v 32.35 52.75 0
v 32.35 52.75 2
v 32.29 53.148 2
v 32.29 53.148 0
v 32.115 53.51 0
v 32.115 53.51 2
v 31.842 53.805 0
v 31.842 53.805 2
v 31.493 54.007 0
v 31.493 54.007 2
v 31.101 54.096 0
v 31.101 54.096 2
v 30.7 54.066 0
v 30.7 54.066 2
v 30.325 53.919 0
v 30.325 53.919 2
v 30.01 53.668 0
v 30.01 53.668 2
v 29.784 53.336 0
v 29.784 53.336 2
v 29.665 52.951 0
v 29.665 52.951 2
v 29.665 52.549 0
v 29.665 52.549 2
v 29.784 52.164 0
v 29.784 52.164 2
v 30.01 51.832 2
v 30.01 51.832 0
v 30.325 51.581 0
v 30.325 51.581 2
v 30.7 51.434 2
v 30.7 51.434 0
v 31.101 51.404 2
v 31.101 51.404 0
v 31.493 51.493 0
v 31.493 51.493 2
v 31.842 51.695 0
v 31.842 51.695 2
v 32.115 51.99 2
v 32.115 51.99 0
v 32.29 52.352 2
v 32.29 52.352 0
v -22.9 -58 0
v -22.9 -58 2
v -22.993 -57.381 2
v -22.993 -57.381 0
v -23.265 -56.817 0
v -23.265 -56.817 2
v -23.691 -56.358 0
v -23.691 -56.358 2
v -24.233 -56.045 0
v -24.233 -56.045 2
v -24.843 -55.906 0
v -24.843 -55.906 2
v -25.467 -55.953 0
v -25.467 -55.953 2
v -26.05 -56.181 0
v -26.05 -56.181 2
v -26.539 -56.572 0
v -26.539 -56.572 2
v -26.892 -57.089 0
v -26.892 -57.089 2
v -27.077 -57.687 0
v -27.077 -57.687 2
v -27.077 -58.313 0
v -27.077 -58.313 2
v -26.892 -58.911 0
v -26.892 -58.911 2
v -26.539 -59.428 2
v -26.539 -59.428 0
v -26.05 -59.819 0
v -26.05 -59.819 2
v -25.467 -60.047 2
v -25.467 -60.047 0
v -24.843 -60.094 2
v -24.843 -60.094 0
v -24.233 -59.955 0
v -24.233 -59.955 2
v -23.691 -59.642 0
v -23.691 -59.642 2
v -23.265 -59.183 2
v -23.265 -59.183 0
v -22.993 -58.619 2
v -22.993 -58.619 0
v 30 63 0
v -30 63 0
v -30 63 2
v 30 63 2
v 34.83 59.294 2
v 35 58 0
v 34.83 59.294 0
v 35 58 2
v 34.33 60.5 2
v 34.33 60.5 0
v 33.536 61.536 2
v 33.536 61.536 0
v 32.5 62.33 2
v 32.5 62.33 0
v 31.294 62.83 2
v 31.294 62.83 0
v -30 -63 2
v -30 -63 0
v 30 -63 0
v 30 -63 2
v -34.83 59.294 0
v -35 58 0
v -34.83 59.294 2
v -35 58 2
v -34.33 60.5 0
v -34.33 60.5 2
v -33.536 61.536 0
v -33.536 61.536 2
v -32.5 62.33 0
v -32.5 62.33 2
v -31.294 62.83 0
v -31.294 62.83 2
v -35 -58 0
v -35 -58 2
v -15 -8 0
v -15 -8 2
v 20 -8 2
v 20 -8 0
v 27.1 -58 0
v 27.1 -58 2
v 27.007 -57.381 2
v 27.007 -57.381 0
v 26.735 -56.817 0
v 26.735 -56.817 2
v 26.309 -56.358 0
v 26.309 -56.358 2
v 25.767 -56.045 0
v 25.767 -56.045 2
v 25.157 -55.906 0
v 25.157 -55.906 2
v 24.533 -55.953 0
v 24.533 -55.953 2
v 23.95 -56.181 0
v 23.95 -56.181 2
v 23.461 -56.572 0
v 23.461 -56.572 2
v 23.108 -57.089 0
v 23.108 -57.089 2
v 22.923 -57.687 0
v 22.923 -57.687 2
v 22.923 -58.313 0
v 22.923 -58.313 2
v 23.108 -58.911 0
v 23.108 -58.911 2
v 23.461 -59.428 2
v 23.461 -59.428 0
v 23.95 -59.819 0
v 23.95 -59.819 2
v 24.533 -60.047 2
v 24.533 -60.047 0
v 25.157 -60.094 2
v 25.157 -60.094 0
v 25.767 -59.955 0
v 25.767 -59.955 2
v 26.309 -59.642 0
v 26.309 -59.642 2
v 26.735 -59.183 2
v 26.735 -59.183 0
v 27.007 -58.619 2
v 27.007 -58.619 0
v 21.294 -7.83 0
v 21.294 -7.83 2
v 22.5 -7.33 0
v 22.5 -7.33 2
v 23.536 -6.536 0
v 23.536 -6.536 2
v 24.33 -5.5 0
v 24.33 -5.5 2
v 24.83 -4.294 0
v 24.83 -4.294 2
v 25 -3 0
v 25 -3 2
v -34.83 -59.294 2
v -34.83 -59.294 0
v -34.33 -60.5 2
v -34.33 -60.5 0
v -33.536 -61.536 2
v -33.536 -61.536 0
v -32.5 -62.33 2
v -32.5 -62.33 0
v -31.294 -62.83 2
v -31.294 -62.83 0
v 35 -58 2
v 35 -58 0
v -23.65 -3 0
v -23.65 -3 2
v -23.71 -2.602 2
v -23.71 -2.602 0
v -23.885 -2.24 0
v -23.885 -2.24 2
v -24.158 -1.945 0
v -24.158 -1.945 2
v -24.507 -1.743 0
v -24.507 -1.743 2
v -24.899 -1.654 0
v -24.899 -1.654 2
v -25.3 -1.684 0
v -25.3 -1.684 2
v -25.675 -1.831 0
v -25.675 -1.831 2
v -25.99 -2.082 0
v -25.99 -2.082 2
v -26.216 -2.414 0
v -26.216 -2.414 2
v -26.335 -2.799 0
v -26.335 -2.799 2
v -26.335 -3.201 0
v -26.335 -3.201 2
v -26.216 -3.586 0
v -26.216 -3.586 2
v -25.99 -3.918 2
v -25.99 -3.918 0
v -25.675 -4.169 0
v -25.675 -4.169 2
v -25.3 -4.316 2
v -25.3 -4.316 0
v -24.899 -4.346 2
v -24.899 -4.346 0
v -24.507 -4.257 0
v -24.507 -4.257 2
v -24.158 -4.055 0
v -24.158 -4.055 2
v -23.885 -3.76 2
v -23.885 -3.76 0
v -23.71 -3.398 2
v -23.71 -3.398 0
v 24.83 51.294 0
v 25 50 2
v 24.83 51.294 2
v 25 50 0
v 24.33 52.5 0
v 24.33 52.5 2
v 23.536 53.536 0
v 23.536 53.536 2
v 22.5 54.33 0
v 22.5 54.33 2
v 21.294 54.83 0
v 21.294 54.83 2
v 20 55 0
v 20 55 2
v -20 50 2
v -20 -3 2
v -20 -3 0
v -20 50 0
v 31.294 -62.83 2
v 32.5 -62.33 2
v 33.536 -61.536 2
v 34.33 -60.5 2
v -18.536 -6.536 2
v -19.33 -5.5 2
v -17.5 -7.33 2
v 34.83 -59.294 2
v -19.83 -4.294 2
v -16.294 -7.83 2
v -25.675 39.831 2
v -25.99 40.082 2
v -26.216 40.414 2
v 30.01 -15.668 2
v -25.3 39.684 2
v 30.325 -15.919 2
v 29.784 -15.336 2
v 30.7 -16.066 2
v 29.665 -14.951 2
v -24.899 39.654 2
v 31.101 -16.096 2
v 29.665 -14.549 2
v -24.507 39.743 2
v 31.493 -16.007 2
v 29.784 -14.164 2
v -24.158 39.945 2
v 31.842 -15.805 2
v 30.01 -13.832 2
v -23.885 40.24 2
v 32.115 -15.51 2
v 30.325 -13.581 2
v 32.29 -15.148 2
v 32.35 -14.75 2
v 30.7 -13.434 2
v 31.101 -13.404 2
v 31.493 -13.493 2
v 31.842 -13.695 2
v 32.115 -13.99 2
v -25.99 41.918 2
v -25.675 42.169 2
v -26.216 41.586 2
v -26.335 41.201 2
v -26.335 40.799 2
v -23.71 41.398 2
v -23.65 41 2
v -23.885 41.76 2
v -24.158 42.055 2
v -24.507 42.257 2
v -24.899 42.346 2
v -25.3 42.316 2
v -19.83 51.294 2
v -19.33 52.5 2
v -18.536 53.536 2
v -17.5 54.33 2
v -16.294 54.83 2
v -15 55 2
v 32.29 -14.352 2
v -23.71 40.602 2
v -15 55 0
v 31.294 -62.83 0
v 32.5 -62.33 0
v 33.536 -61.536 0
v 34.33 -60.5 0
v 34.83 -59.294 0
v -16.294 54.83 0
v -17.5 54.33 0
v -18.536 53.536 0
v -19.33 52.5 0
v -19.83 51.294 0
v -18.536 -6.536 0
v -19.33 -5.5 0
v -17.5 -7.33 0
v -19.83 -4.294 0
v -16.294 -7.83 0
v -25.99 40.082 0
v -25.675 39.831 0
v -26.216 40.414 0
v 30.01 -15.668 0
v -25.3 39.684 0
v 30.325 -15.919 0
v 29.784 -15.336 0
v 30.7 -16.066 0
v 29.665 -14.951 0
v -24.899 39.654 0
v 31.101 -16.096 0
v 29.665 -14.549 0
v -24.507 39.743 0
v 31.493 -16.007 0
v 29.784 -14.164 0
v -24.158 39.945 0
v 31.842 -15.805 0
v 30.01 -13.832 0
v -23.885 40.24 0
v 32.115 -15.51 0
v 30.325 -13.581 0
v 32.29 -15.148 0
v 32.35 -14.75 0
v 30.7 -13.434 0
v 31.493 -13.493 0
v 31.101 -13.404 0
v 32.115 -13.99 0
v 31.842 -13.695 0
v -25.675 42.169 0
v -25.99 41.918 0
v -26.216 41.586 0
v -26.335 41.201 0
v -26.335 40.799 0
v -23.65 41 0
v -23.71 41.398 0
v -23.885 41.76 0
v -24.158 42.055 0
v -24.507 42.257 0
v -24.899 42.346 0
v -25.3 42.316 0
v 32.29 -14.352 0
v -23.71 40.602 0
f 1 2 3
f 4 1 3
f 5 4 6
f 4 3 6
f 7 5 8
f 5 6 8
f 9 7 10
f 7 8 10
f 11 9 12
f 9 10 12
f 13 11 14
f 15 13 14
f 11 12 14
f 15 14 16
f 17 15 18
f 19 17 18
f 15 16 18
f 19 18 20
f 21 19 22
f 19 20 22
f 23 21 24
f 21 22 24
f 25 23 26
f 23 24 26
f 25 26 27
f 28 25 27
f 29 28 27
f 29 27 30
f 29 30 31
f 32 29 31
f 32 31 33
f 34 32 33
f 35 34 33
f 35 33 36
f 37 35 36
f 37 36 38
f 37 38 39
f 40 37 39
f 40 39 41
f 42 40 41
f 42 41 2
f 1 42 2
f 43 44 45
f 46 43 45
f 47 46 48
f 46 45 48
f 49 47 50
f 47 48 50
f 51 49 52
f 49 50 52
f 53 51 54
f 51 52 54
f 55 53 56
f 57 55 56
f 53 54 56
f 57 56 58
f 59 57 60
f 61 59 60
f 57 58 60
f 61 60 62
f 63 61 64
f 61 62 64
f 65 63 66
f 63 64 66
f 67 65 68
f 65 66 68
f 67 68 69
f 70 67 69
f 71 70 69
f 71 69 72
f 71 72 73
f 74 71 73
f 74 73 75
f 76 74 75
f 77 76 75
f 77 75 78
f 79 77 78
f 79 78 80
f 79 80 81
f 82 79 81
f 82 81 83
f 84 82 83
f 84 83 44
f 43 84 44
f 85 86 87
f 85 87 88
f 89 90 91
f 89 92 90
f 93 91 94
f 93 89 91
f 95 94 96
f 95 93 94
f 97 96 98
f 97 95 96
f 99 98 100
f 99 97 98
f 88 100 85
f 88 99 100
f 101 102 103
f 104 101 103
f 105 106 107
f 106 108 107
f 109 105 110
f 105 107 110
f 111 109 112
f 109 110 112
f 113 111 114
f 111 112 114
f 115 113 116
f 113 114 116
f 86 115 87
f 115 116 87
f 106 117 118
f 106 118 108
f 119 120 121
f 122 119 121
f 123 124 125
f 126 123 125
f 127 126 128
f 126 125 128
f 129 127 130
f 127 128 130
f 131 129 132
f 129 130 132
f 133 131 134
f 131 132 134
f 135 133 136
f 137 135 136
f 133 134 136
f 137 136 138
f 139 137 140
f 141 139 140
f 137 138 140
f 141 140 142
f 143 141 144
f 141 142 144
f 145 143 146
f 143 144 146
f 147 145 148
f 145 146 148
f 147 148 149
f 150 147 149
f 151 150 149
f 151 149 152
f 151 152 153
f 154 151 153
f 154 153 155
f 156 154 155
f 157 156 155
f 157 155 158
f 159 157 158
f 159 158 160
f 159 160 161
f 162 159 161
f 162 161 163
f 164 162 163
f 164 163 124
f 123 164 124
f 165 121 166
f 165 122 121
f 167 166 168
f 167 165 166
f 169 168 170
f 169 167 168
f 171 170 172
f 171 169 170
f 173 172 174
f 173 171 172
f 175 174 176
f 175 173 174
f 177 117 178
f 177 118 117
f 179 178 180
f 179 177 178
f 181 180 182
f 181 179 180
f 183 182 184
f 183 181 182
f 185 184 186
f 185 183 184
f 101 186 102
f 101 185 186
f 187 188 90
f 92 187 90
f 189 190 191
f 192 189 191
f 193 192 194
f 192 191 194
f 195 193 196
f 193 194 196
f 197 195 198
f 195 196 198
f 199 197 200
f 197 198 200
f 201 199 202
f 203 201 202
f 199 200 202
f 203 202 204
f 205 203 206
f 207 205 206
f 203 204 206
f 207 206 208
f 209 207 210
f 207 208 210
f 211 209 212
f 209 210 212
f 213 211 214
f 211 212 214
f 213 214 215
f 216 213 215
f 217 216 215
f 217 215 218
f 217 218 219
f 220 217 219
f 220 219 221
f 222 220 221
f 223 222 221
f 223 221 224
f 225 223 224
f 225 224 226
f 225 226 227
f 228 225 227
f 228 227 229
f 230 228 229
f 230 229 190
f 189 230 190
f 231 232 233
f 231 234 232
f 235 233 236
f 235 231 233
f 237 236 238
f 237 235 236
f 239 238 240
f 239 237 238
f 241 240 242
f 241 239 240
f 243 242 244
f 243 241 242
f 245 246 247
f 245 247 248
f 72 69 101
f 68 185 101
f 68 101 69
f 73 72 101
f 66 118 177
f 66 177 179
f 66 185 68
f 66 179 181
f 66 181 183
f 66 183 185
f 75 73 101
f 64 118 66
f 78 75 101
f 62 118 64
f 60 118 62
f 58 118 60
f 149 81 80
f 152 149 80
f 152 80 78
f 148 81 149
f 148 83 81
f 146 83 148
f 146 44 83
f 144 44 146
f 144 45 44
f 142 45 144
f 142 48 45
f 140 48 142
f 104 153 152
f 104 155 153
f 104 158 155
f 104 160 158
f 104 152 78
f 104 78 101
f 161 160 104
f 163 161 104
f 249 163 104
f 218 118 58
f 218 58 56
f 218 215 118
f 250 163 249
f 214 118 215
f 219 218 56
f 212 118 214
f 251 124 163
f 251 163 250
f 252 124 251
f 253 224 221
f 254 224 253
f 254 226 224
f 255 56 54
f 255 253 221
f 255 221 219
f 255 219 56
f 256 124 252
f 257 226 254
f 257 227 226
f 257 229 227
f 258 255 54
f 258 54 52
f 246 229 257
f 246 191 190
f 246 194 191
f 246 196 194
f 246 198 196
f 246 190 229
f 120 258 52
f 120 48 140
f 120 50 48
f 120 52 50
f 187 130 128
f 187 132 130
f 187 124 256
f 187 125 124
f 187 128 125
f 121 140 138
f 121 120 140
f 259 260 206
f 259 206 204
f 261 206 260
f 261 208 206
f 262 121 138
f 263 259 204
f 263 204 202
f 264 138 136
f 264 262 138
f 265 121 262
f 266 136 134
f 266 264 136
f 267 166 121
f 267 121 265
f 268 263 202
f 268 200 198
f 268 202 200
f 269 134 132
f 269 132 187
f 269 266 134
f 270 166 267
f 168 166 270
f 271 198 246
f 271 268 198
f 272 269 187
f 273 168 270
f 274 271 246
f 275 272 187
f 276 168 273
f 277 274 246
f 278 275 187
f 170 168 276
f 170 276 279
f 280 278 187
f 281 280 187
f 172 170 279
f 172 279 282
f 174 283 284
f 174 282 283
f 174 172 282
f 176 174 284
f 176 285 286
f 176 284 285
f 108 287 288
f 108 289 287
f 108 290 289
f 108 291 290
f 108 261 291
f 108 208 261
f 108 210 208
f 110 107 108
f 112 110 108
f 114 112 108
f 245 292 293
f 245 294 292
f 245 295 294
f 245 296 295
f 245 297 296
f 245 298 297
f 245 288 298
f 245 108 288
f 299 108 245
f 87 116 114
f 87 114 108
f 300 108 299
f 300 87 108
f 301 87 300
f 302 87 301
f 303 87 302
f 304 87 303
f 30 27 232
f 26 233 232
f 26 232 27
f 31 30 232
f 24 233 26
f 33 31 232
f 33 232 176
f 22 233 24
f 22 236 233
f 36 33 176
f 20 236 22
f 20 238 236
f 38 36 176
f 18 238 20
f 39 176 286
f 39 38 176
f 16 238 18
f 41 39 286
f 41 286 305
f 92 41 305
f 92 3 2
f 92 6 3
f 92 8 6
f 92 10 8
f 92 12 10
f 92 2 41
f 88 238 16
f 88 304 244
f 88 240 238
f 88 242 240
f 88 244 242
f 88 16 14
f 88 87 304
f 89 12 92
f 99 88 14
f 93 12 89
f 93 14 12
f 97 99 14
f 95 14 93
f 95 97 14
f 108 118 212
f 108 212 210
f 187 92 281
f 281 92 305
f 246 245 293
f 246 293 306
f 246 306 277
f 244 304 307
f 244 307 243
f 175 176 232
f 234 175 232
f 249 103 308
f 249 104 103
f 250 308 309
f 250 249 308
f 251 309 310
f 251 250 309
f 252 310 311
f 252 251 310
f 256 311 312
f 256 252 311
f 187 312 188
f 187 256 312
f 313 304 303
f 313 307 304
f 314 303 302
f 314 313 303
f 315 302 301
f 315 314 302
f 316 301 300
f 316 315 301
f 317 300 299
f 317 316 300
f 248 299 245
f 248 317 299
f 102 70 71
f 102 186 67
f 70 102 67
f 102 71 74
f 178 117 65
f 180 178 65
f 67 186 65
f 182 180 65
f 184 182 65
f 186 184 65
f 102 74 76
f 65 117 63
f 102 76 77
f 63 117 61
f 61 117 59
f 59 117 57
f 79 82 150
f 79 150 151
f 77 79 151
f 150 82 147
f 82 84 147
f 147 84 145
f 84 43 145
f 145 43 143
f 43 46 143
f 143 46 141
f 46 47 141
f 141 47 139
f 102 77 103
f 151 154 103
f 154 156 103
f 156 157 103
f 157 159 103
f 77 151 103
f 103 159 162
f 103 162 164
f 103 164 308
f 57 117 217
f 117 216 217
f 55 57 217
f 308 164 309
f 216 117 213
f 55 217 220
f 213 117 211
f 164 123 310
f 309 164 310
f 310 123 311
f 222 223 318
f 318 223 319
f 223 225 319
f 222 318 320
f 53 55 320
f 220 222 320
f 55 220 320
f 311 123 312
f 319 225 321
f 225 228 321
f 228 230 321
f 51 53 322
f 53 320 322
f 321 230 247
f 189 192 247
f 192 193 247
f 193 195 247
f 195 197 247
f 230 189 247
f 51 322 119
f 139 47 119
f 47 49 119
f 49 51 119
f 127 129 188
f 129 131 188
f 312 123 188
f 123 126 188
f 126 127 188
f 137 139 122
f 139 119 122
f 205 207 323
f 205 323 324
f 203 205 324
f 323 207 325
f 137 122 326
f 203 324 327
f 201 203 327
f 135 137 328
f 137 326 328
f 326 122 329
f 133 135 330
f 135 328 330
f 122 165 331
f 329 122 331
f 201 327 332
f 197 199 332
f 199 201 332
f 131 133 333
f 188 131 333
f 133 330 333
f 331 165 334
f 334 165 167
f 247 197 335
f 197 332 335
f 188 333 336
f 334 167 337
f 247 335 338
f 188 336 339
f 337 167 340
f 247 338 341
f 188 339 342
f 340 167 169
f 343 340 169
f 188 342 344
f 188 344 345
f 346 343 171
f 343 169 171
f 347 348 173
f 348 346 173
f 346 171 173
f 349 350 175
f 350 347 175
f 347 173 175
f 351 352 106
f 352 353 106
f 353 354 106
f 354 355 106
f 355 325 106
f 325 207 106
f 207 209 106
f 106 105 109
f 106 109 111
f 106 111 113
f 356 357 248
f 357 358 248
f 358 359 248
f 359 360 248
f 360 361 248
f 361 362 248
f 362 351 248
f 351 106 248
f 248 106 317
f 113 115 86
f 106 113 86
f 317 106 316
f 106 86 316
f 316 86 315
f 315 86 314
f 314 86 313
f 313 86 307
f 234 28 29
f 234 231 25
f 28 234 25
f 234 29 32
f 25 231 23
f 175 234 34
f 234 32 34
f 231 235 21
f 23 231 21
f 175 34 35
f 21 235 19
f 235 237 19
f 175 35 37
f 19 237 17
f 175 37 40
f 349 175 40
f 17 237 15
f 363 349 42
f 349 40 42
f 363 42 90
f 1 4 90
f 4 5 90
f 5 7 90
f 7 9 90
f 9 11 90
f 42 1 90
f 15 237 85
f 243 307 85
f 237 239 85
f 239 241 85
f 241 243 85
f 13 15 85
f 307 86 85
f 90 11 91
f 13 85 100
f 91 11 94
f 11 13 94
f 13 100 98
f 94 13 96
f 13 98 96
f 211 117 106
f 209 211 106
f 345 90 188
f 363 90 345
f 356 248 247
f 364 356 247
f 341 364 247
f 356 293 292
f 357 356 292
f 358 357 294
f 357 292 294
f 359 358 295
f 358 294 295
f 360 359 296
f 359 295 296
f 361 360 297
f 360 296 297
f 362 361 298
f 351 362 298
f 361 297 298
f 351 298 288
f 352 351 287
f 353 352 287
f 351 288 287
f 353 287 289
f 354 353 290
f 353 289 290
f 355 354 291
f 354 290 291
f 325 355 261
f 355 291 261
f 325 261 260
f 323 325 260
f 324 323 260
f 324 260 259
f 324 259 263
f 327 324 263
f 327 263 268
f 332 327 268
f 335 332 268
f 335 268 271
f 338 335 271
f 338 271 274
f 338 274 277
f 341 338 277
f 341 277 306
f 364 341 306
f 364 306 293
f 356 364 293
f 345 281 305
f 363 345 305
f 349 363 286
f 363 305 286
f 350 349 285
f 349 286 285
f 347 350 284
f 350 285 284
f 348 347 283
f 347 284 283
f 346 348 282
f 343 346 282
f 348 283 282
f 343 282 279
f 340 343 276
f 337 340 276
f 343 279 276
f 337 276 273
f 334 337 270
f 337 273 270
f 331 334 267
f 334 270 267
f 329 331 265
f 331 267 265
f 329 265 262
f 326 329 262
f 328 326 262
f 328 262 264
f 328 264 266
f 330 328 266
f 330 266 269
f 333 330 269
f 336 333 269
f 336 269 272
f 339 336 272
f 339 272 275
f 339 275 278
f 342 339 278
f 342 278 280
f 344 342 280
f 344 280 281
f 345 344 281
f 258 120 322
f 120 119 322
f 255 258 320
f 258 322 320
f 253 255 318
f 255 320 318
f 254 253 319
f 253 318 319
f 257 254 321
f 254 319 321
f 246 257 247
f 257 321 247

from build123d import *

# Parameters (mm, degrees)
SKETCH_1_W          = 70
SKETCH_1_H          = 126
EXTRUDE_1_DEPTH     = 2
FILLET_1_R          = 5
SKETCH_2_R          = 2.1
SKETCH_2_R_2        = 1.35
CUT_EXTRUDE_1_DEPTH = 3
SKETCH_3_W          = 45
SKETCH_3_H          = 63
CUT_EXTRUDE_2_DEPTH = 10
FILLET_2_R          = 5


with BuildPart() as part:
    # 草图1 → 凸台-拉伸1 (new body)
    with BuildSketch(Plane.XY):
        Rectangle(SKETCH_1_W, SKETCH_1_H)
    extrude(amount=EXTRUDE_1_DEPTH)

    # 圆角1
    fillet_1_edges = [part.edges().sort_by_distance(p)[0] for p in [
        (35, -63, 1),
        (-35, -63, 1),
        (-35, 63, 1),
        (35, 63, 1),
    ]]
    fillet(fillet_1_edges, radius=FILLET_1_R)

    # 草图2 → 切除-拉伸1 (cut, through all)
    with BuildSketch(Plane.XY.offset(2)):
        with Locations((-25, -58)):
            Circle(SKETCH_2_R)
        with Locations((25, -58)):
            Circle(SKETCH_2_R)
        with Locations((-25, -3)):
            Circle(SKETCH_2_R_2)
        with Locations((-25, 41)):
            Circle(SKETCH_2_R_2)
        with Locations((31, 52.75)):
            Circle(SKETCH_2_R_2)
        with Locations((31, -14.75)):
            Circle(SKETCH_2_R_2)
    extrude(amount=-CUT_EXTRUDE_1_DEPTH, mode=Mode.SUBTRACT)

    # 草图3 → 切除-拉伸2 (cut)
    with BuildSketch(Plane.XY.offset(2)):
        with Locations((2.5, 23.5)):
            Rectangle(SKETCH_3_W, SKETCH_3_H)
    extrude(amount=-CUT_EXTRUDE_2_DEPTH, mode=Mode.SUBTRACT)

    # 圆角2
    fillet_2_edges = [part.edges().sort_by_distance(p)[0] for p in [
        (25, 55, 1),
        (25, -8, 1),
        (-20, -8, 1),
        (-20, 55, 1),
    ]]
    fillet(fillet_2_edges, radius=FILLET_2_R)


solid = part.part
